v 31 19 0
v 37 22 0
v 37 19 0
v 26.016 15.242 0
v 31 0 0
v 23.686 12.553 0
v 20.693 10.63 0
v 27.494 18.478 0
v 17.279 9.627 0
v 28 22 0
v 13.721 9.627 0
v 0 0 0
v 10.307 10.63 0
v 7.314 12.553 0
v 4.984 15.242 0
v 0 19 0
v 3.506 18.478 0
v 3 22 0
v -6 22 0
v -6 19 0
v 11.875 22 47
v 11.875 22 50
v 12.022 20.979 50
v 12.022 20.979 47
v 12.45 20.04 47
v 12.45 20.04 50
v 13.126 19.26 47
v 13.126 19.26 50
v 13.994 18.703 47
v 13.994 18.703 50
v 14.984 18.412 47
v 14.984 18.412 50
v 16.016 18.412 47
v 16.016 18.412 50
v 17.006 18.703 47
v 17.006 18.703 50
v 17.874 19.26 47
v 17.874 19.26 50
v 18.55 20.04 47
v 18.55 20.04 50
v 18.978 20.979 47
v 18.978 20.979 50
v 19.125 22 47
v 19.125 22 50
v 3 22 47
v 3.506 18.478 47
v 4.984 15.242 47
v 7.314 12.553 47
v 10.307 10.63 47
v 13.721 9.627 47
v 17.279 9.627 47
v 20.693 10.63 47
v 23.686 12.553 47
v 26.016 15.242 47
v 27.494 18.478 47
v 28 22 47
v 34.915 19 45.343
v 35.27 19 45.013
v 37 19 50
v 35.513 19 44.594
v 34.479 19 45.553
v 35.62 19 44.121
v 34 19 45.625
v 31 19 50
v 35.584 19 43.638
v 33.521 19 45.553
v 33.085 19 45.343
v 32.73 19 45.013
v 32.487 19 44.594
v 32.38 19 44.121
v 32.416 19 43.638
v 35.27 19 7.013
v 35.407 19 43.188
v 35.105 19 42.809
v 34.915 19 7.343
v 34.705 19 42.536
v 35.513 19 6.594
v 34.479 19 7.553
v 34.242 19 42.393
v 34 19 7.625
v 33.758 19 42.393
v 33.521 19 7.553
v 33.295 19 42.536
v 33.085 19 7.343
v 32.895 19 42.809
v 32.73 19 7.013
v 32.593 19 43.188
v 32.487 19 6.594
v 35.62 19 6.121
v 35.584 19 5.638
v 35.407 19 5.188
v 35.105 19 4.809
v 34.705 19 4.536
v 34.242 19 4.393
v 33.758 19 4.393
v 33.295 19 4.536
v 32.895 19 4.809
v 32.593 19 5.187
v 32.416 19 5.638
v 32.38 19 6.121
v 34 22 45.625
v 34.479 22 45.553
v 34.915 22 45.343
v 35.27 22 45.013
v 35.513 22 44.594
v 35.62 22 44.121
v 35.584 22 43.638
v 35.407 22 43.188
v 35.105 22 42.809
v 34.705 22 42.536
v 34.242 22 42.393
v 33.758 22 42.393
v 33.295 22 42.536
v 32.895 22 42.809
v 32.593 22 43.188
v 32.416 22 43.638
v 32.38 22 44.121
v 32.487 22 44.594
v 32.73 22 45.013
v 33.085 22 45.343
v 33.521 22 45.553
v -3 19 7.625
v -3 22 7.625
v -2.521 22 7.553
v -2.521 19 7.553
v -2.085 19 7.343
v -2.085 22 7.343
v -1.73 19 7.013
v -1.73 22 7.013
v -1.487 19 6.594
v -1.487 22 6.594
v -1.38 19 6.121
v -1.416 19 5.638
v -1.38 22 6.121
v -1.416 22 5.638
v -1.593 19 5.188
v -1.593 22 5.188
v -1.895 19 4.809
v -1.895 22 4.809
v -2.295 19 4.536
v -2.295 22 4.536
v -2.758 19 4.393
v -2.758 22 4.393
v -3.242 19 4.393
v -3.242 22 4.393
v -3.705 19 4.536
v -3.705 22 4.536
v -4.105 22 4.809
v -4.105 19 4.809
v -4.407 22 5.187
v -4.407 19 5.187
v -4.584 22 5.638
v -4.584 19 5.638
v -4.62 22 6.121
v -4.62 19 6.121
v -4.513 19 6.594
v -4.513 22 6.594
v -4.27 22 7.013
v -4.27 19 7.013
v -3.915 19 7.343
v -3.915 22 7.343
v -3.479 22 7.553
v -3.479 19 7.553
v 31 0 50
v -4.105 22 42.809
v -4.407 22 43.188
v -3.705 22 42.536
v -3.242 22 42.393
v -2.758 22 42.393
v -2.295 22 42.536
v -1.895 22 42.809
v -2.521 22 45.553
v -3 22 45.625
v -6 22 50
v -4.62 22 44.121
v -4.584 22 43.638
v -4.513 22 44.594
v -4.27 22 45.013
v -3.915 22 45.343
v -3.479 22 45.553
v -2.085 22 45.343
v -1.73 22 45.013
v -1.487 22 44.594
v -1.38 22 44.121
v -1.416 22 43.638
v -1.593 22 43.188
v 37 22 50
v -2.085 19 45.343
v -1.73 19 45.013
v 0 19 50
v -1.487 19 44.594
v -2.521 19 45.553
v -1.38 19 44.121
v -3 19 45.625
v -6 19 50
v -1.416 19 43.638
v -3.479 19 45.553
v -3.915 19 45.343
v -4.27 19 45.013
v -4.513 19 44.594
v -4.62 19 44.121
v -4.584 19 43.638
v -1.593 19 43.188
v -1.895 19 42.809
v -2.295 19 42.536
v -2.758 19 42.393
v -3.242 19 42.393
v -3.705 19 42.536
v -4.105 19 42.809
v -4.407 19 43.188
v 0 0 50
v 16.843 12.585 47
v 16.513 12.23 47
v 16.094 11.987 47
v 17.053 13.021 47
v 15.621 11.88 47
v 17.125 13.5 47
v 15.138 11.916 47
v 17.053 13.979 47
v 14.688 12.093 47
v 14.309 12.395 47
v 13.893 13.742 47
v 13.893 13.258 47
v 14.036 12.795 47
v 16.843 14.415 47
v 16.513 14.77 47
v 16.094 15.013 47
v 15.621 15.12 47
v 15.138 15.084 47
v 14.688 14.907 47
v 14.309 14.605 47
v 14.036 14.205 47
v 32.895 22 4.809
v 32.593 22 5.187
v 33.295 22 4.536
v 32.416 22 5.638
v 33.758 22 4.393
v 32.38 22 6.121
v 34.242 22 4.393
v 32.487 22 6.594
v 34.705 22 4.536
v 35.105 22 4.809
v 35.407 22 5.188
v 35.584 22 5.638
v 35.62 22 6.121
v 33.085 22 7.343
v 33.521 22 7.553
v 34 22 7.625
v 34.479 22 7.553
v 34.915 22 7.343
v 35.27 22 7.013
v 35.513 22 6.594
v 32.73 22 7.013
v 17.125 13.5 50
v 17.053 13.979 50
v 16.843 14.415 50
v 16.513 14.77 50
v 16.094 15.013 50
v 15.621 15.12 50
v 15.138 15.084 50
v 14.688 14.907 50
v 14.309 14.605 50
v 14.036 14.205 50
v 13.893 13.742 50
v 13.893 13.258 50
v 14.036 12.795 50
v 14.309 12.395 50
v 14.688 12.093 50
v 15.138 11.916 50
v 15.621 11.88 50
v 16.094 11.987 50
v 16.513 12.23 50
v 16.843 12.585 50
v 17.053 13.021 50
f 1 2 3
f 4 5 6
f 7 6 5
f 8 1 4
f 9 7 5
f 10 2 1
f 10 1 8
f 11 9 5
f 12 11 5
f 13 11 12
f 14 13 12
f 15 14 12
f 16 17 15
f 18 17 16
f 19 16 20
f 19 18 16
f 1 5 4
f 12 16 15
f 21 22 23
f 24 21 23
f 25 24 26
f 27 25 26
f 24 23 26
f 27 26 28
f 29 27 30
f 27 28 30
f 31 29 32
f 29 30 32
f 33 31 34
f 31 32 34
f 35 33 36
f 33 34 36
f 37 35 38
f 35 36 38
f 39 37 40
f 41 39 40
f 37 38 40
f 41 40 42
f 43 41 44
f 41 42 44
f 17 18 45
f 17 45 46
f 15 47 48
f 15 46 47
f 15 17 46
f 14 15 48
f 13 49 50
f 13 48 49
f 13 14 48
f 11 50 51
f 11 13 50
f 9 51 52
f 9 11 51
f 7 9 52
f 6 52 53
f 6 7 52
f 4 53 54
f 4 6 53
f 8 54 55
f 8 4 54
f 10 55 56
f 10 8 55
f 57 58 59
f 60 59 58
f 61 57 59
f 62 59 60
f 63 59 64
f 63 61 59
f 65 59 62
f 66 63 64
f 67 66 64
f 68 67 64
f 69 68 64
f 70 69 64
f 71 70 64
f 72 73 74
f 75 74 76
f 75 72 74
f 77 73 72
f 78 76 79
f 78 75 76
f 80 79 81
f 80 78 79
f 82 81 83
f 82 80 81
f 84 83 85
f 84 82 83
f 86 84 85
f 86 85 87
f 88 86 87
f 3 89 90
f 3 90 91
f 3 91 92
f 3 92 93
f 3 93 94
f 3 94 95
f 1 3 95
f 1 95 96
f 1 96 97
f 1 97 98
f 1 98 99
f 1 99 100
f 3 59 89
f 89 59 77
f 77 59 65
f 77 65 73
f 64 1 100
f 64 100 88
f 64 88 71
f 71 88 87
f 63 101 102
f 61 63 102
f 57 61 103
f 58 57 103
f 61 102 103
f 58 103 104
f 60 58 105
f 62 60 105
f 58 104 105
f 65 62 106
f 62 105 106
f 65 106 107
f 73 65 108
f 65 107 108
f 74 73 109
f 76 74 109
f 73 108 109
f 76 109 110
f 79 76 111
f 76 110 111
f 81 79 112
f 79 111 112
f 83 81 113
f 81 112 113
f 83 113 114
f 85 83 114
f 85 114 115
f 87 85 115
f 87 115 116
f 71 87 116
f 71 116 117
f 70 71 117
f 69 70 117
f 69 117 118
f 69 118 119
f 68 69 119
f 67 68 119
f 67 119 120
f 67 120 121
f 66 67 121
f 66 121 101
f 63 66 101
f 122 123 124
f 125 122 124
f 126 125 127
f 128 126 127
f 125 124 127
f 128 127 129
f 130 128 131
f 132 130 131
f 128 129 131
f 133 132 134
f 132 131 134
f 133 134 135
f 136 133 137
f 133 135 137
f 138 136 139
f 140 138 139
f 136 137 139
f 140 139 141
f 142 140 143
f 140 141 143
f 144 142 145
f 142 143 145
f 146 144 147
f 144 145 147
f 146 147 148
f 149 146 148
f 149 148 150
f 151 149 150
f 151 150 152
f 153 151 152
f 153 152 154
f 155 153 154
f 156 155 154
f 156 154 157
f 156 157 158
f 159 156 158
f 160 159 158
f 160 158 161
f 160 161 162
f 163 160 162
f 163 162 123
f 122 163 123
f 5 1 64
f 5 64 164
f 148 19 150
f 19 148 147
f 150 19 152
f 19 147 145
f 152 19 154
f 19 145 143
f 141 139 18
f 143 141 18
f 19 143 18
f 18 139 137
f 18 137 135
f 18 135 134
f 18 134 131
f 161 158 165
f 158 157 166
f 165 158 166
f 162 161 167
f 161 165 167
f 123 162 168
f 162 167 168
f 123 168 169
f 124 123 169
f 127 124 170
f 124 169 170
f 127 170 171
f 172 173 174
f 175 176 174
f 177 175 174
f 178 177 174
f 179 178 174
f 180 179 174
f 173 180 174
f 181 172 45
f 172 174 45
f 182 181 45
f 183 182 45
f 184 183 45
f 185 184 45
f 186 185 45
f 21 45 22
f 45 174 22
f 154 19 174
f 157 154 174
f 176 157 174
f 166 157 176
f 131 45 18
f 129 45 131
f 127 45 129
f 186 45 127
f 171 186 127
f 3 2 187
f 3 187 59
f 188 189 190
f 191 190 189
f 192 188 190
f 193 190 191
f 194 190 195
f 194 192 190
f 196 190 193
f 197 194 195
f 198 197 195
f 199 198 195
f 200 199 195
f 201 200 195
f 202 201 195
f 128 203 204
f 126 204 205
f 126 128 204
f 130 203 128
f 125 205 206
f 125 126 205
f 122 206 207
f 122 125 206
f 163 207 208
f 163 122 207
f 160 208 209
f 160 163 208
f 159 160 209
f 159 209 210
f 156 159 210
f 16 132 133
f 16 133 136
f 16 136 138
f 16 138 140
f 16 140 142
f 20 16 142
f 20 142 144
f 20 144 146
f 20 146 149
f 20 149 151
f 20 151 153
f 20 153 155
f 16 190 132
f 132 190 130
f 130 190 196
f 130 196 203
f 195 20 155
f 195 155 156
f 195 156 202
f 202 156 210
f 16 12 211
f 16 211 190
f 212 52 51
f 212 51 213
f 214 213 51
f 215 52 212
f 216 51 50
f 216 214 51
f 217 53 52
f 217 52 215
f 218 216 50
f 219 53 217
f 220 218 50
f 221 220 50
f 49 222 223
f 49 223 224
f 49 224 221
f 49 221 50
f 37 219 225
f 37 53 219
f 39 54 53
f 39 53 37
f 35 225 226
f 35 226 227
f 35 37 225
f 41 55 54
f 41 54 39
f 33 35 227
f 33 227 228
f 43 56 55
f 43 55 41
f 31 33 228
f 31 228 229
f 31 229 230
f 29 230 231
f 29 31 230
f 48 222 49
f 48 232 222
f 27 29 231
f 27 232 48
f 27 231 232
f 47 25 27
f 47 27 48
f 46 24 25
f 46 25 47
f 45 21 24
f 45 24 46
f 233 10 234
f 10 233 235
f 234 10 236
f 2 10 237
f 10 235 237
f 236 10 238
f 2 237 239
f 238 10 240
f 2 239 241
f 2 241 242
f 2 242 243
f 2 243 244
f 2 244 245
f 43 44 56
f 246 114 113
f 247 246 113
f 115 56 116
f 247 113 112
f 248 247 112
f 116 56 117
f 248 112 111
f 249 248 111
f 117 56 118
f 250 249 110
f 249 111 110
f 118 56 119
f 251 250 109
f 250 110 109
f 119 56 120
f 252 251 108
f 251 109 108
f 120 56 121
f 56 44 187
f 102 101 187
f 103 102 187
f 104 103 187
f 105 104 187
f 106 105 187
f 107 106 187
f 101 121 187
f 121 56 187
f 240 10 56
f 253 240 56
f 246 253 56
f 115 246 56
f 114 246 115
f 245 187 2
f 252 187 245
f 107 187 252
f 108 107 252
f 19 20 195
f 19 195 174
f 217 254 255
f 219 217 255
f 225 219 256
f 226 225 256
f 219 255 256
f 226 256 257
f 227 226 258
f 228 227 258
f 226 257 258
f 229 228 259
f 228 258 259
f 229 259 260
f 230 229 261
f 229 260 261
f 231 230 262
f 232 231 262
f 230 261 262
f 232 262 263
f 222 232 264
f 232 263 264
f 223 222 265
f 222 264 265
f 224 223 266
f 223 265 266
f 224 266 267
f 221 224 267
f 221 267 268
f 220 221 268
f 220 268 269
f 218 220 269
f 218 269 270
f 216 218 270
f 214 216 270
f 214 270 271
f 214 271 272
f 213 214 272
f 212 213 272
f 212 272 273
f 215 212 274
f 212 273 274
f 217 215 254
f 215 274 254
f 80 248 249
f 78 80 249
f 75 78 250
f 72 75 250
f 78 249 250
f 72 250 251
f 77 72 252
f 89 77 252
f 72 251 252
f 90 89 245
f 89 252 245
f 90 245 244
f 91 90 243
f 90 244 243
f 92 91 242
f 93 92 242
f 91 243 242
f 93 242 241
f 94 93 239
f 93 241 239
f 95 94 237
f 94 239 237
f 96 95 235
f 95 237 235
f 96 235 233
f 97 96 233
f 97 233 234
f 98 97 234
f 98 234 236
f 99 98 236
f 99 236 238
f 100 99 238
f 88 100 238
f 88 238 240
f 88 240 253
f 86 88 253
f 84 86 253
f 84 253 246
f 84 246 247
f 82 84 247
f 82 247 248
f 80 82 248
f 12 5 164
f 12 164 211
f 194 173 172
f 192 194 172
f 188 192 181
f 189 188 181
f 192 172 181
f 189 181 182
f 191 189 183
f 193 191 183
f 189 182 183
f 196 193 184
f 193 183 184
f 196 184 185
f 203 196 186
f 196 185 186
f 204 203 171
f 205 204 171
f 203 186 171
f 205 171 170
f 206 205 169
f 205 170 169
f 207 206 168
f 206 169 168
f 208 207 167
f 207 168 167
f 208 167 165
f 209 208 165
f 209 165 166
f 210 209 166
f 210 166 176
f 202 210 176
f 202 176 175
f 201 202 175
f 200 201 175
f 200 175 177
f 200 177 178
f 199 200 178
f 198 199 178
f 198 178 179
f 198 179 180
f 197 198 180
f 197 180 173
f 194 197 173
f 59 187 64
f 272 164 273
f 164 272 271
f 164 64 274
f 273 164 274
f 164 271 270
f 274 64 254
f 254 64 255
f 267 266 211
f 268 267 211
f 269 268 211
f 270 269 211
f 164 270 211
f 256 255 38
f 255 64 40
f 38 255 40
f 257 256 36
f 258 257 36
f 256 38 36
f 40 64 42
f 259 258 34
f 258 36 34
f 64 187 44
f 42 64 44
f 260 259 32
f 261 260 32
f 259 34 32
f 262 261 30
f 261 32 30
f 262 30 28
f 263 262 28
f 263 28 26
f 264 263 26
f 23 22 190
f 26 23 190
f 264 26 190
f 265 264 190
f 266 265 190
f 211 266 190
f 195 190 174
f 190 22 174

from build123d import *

# Parameters (mm, degrees)
BOSS_EXTRU_1_DEPTH      = 50
ESQUISSE4_R             = 1.625
ENL_V_MAT_EXTRU_1_DEPTH = 50
ESQUISSE7_R             = 1.625
BOSS_EXTRU_2_DEPTH      = 3


with BuildPart() as part:
    # Esquisse1 → Boss.-Extru.1 (new body)
    with BuildSketch(Plane.XY):
        with BuildLine():
            Line((-6, 19), (-6, 22))
            Line((-6, 22), (3, 22))
            ThreePointArc((3, 22), (15.5, 9.5), (28, 22))
            Line((28, 22), (37, 22))
            Line((37, 22), (37, 19))
            Line((37, 19), (31, 19))
            Line((31, 19), (31, 0))
            Line((31, 0), (0, 0))
            Line((0, 0), (0, 19))
            Line((0, 19), (-6, 19))
        make_face()
    extrude(amount=BOSS_EXTRU_1_DEPTH)

    # Esquisse4 → Enlèv. mat.-Extru.1 (cut)
    with BuildSketch(Plane(origin=(0, 22, 0), x_dir=(1, 0, 0), z_dir=(0, 1, 0))):
        with Locations(Location((-3, -44, 0), (0, 0, 270))):
            Circle(ESQUISSE4_R)
        with Locations(Location((34, -44, 0), (0, 0, 270))):
            Circle(ESQUISSE4_R)
        with Locations(Location((34, -6, 0), (0, 0, 270))):
            Circle(ESQUISSE4_R)
        with Locations(Location((-3, -6, 0), (0, 0, 270))):
            Circle(ESQUISSE4_R)
    extrude(amount=-ENL_V_MAT_EXTRU_1_DEPTH, mode=Mode.SUBTRACT)

    # Esquisse7 → Boss.-Extru.2 (add)
    with BuildSketch(Plane.XY.offset(50)):
        with BuildLine():
            Line((19.125, 22), (28, 22))
            Line((28, 22), (28, 9.5))
            Line((28, 9.5), (3, 9.5))
            Line((3, 9.5), (3, 22))
            Line((3, 22), (11.875, 22))
            ThreePointArc((11.875, 22), (15.5, 18.375), (19.125, 22))
        make_face()
        with Locations((15.5, 13.5)):
            Circle(ESQUISSE7_R, mode=Mode.SUBTRACT)
    extrude(amount=-BOSS_EXTRU_2_DEPTH)


solid = part.part
